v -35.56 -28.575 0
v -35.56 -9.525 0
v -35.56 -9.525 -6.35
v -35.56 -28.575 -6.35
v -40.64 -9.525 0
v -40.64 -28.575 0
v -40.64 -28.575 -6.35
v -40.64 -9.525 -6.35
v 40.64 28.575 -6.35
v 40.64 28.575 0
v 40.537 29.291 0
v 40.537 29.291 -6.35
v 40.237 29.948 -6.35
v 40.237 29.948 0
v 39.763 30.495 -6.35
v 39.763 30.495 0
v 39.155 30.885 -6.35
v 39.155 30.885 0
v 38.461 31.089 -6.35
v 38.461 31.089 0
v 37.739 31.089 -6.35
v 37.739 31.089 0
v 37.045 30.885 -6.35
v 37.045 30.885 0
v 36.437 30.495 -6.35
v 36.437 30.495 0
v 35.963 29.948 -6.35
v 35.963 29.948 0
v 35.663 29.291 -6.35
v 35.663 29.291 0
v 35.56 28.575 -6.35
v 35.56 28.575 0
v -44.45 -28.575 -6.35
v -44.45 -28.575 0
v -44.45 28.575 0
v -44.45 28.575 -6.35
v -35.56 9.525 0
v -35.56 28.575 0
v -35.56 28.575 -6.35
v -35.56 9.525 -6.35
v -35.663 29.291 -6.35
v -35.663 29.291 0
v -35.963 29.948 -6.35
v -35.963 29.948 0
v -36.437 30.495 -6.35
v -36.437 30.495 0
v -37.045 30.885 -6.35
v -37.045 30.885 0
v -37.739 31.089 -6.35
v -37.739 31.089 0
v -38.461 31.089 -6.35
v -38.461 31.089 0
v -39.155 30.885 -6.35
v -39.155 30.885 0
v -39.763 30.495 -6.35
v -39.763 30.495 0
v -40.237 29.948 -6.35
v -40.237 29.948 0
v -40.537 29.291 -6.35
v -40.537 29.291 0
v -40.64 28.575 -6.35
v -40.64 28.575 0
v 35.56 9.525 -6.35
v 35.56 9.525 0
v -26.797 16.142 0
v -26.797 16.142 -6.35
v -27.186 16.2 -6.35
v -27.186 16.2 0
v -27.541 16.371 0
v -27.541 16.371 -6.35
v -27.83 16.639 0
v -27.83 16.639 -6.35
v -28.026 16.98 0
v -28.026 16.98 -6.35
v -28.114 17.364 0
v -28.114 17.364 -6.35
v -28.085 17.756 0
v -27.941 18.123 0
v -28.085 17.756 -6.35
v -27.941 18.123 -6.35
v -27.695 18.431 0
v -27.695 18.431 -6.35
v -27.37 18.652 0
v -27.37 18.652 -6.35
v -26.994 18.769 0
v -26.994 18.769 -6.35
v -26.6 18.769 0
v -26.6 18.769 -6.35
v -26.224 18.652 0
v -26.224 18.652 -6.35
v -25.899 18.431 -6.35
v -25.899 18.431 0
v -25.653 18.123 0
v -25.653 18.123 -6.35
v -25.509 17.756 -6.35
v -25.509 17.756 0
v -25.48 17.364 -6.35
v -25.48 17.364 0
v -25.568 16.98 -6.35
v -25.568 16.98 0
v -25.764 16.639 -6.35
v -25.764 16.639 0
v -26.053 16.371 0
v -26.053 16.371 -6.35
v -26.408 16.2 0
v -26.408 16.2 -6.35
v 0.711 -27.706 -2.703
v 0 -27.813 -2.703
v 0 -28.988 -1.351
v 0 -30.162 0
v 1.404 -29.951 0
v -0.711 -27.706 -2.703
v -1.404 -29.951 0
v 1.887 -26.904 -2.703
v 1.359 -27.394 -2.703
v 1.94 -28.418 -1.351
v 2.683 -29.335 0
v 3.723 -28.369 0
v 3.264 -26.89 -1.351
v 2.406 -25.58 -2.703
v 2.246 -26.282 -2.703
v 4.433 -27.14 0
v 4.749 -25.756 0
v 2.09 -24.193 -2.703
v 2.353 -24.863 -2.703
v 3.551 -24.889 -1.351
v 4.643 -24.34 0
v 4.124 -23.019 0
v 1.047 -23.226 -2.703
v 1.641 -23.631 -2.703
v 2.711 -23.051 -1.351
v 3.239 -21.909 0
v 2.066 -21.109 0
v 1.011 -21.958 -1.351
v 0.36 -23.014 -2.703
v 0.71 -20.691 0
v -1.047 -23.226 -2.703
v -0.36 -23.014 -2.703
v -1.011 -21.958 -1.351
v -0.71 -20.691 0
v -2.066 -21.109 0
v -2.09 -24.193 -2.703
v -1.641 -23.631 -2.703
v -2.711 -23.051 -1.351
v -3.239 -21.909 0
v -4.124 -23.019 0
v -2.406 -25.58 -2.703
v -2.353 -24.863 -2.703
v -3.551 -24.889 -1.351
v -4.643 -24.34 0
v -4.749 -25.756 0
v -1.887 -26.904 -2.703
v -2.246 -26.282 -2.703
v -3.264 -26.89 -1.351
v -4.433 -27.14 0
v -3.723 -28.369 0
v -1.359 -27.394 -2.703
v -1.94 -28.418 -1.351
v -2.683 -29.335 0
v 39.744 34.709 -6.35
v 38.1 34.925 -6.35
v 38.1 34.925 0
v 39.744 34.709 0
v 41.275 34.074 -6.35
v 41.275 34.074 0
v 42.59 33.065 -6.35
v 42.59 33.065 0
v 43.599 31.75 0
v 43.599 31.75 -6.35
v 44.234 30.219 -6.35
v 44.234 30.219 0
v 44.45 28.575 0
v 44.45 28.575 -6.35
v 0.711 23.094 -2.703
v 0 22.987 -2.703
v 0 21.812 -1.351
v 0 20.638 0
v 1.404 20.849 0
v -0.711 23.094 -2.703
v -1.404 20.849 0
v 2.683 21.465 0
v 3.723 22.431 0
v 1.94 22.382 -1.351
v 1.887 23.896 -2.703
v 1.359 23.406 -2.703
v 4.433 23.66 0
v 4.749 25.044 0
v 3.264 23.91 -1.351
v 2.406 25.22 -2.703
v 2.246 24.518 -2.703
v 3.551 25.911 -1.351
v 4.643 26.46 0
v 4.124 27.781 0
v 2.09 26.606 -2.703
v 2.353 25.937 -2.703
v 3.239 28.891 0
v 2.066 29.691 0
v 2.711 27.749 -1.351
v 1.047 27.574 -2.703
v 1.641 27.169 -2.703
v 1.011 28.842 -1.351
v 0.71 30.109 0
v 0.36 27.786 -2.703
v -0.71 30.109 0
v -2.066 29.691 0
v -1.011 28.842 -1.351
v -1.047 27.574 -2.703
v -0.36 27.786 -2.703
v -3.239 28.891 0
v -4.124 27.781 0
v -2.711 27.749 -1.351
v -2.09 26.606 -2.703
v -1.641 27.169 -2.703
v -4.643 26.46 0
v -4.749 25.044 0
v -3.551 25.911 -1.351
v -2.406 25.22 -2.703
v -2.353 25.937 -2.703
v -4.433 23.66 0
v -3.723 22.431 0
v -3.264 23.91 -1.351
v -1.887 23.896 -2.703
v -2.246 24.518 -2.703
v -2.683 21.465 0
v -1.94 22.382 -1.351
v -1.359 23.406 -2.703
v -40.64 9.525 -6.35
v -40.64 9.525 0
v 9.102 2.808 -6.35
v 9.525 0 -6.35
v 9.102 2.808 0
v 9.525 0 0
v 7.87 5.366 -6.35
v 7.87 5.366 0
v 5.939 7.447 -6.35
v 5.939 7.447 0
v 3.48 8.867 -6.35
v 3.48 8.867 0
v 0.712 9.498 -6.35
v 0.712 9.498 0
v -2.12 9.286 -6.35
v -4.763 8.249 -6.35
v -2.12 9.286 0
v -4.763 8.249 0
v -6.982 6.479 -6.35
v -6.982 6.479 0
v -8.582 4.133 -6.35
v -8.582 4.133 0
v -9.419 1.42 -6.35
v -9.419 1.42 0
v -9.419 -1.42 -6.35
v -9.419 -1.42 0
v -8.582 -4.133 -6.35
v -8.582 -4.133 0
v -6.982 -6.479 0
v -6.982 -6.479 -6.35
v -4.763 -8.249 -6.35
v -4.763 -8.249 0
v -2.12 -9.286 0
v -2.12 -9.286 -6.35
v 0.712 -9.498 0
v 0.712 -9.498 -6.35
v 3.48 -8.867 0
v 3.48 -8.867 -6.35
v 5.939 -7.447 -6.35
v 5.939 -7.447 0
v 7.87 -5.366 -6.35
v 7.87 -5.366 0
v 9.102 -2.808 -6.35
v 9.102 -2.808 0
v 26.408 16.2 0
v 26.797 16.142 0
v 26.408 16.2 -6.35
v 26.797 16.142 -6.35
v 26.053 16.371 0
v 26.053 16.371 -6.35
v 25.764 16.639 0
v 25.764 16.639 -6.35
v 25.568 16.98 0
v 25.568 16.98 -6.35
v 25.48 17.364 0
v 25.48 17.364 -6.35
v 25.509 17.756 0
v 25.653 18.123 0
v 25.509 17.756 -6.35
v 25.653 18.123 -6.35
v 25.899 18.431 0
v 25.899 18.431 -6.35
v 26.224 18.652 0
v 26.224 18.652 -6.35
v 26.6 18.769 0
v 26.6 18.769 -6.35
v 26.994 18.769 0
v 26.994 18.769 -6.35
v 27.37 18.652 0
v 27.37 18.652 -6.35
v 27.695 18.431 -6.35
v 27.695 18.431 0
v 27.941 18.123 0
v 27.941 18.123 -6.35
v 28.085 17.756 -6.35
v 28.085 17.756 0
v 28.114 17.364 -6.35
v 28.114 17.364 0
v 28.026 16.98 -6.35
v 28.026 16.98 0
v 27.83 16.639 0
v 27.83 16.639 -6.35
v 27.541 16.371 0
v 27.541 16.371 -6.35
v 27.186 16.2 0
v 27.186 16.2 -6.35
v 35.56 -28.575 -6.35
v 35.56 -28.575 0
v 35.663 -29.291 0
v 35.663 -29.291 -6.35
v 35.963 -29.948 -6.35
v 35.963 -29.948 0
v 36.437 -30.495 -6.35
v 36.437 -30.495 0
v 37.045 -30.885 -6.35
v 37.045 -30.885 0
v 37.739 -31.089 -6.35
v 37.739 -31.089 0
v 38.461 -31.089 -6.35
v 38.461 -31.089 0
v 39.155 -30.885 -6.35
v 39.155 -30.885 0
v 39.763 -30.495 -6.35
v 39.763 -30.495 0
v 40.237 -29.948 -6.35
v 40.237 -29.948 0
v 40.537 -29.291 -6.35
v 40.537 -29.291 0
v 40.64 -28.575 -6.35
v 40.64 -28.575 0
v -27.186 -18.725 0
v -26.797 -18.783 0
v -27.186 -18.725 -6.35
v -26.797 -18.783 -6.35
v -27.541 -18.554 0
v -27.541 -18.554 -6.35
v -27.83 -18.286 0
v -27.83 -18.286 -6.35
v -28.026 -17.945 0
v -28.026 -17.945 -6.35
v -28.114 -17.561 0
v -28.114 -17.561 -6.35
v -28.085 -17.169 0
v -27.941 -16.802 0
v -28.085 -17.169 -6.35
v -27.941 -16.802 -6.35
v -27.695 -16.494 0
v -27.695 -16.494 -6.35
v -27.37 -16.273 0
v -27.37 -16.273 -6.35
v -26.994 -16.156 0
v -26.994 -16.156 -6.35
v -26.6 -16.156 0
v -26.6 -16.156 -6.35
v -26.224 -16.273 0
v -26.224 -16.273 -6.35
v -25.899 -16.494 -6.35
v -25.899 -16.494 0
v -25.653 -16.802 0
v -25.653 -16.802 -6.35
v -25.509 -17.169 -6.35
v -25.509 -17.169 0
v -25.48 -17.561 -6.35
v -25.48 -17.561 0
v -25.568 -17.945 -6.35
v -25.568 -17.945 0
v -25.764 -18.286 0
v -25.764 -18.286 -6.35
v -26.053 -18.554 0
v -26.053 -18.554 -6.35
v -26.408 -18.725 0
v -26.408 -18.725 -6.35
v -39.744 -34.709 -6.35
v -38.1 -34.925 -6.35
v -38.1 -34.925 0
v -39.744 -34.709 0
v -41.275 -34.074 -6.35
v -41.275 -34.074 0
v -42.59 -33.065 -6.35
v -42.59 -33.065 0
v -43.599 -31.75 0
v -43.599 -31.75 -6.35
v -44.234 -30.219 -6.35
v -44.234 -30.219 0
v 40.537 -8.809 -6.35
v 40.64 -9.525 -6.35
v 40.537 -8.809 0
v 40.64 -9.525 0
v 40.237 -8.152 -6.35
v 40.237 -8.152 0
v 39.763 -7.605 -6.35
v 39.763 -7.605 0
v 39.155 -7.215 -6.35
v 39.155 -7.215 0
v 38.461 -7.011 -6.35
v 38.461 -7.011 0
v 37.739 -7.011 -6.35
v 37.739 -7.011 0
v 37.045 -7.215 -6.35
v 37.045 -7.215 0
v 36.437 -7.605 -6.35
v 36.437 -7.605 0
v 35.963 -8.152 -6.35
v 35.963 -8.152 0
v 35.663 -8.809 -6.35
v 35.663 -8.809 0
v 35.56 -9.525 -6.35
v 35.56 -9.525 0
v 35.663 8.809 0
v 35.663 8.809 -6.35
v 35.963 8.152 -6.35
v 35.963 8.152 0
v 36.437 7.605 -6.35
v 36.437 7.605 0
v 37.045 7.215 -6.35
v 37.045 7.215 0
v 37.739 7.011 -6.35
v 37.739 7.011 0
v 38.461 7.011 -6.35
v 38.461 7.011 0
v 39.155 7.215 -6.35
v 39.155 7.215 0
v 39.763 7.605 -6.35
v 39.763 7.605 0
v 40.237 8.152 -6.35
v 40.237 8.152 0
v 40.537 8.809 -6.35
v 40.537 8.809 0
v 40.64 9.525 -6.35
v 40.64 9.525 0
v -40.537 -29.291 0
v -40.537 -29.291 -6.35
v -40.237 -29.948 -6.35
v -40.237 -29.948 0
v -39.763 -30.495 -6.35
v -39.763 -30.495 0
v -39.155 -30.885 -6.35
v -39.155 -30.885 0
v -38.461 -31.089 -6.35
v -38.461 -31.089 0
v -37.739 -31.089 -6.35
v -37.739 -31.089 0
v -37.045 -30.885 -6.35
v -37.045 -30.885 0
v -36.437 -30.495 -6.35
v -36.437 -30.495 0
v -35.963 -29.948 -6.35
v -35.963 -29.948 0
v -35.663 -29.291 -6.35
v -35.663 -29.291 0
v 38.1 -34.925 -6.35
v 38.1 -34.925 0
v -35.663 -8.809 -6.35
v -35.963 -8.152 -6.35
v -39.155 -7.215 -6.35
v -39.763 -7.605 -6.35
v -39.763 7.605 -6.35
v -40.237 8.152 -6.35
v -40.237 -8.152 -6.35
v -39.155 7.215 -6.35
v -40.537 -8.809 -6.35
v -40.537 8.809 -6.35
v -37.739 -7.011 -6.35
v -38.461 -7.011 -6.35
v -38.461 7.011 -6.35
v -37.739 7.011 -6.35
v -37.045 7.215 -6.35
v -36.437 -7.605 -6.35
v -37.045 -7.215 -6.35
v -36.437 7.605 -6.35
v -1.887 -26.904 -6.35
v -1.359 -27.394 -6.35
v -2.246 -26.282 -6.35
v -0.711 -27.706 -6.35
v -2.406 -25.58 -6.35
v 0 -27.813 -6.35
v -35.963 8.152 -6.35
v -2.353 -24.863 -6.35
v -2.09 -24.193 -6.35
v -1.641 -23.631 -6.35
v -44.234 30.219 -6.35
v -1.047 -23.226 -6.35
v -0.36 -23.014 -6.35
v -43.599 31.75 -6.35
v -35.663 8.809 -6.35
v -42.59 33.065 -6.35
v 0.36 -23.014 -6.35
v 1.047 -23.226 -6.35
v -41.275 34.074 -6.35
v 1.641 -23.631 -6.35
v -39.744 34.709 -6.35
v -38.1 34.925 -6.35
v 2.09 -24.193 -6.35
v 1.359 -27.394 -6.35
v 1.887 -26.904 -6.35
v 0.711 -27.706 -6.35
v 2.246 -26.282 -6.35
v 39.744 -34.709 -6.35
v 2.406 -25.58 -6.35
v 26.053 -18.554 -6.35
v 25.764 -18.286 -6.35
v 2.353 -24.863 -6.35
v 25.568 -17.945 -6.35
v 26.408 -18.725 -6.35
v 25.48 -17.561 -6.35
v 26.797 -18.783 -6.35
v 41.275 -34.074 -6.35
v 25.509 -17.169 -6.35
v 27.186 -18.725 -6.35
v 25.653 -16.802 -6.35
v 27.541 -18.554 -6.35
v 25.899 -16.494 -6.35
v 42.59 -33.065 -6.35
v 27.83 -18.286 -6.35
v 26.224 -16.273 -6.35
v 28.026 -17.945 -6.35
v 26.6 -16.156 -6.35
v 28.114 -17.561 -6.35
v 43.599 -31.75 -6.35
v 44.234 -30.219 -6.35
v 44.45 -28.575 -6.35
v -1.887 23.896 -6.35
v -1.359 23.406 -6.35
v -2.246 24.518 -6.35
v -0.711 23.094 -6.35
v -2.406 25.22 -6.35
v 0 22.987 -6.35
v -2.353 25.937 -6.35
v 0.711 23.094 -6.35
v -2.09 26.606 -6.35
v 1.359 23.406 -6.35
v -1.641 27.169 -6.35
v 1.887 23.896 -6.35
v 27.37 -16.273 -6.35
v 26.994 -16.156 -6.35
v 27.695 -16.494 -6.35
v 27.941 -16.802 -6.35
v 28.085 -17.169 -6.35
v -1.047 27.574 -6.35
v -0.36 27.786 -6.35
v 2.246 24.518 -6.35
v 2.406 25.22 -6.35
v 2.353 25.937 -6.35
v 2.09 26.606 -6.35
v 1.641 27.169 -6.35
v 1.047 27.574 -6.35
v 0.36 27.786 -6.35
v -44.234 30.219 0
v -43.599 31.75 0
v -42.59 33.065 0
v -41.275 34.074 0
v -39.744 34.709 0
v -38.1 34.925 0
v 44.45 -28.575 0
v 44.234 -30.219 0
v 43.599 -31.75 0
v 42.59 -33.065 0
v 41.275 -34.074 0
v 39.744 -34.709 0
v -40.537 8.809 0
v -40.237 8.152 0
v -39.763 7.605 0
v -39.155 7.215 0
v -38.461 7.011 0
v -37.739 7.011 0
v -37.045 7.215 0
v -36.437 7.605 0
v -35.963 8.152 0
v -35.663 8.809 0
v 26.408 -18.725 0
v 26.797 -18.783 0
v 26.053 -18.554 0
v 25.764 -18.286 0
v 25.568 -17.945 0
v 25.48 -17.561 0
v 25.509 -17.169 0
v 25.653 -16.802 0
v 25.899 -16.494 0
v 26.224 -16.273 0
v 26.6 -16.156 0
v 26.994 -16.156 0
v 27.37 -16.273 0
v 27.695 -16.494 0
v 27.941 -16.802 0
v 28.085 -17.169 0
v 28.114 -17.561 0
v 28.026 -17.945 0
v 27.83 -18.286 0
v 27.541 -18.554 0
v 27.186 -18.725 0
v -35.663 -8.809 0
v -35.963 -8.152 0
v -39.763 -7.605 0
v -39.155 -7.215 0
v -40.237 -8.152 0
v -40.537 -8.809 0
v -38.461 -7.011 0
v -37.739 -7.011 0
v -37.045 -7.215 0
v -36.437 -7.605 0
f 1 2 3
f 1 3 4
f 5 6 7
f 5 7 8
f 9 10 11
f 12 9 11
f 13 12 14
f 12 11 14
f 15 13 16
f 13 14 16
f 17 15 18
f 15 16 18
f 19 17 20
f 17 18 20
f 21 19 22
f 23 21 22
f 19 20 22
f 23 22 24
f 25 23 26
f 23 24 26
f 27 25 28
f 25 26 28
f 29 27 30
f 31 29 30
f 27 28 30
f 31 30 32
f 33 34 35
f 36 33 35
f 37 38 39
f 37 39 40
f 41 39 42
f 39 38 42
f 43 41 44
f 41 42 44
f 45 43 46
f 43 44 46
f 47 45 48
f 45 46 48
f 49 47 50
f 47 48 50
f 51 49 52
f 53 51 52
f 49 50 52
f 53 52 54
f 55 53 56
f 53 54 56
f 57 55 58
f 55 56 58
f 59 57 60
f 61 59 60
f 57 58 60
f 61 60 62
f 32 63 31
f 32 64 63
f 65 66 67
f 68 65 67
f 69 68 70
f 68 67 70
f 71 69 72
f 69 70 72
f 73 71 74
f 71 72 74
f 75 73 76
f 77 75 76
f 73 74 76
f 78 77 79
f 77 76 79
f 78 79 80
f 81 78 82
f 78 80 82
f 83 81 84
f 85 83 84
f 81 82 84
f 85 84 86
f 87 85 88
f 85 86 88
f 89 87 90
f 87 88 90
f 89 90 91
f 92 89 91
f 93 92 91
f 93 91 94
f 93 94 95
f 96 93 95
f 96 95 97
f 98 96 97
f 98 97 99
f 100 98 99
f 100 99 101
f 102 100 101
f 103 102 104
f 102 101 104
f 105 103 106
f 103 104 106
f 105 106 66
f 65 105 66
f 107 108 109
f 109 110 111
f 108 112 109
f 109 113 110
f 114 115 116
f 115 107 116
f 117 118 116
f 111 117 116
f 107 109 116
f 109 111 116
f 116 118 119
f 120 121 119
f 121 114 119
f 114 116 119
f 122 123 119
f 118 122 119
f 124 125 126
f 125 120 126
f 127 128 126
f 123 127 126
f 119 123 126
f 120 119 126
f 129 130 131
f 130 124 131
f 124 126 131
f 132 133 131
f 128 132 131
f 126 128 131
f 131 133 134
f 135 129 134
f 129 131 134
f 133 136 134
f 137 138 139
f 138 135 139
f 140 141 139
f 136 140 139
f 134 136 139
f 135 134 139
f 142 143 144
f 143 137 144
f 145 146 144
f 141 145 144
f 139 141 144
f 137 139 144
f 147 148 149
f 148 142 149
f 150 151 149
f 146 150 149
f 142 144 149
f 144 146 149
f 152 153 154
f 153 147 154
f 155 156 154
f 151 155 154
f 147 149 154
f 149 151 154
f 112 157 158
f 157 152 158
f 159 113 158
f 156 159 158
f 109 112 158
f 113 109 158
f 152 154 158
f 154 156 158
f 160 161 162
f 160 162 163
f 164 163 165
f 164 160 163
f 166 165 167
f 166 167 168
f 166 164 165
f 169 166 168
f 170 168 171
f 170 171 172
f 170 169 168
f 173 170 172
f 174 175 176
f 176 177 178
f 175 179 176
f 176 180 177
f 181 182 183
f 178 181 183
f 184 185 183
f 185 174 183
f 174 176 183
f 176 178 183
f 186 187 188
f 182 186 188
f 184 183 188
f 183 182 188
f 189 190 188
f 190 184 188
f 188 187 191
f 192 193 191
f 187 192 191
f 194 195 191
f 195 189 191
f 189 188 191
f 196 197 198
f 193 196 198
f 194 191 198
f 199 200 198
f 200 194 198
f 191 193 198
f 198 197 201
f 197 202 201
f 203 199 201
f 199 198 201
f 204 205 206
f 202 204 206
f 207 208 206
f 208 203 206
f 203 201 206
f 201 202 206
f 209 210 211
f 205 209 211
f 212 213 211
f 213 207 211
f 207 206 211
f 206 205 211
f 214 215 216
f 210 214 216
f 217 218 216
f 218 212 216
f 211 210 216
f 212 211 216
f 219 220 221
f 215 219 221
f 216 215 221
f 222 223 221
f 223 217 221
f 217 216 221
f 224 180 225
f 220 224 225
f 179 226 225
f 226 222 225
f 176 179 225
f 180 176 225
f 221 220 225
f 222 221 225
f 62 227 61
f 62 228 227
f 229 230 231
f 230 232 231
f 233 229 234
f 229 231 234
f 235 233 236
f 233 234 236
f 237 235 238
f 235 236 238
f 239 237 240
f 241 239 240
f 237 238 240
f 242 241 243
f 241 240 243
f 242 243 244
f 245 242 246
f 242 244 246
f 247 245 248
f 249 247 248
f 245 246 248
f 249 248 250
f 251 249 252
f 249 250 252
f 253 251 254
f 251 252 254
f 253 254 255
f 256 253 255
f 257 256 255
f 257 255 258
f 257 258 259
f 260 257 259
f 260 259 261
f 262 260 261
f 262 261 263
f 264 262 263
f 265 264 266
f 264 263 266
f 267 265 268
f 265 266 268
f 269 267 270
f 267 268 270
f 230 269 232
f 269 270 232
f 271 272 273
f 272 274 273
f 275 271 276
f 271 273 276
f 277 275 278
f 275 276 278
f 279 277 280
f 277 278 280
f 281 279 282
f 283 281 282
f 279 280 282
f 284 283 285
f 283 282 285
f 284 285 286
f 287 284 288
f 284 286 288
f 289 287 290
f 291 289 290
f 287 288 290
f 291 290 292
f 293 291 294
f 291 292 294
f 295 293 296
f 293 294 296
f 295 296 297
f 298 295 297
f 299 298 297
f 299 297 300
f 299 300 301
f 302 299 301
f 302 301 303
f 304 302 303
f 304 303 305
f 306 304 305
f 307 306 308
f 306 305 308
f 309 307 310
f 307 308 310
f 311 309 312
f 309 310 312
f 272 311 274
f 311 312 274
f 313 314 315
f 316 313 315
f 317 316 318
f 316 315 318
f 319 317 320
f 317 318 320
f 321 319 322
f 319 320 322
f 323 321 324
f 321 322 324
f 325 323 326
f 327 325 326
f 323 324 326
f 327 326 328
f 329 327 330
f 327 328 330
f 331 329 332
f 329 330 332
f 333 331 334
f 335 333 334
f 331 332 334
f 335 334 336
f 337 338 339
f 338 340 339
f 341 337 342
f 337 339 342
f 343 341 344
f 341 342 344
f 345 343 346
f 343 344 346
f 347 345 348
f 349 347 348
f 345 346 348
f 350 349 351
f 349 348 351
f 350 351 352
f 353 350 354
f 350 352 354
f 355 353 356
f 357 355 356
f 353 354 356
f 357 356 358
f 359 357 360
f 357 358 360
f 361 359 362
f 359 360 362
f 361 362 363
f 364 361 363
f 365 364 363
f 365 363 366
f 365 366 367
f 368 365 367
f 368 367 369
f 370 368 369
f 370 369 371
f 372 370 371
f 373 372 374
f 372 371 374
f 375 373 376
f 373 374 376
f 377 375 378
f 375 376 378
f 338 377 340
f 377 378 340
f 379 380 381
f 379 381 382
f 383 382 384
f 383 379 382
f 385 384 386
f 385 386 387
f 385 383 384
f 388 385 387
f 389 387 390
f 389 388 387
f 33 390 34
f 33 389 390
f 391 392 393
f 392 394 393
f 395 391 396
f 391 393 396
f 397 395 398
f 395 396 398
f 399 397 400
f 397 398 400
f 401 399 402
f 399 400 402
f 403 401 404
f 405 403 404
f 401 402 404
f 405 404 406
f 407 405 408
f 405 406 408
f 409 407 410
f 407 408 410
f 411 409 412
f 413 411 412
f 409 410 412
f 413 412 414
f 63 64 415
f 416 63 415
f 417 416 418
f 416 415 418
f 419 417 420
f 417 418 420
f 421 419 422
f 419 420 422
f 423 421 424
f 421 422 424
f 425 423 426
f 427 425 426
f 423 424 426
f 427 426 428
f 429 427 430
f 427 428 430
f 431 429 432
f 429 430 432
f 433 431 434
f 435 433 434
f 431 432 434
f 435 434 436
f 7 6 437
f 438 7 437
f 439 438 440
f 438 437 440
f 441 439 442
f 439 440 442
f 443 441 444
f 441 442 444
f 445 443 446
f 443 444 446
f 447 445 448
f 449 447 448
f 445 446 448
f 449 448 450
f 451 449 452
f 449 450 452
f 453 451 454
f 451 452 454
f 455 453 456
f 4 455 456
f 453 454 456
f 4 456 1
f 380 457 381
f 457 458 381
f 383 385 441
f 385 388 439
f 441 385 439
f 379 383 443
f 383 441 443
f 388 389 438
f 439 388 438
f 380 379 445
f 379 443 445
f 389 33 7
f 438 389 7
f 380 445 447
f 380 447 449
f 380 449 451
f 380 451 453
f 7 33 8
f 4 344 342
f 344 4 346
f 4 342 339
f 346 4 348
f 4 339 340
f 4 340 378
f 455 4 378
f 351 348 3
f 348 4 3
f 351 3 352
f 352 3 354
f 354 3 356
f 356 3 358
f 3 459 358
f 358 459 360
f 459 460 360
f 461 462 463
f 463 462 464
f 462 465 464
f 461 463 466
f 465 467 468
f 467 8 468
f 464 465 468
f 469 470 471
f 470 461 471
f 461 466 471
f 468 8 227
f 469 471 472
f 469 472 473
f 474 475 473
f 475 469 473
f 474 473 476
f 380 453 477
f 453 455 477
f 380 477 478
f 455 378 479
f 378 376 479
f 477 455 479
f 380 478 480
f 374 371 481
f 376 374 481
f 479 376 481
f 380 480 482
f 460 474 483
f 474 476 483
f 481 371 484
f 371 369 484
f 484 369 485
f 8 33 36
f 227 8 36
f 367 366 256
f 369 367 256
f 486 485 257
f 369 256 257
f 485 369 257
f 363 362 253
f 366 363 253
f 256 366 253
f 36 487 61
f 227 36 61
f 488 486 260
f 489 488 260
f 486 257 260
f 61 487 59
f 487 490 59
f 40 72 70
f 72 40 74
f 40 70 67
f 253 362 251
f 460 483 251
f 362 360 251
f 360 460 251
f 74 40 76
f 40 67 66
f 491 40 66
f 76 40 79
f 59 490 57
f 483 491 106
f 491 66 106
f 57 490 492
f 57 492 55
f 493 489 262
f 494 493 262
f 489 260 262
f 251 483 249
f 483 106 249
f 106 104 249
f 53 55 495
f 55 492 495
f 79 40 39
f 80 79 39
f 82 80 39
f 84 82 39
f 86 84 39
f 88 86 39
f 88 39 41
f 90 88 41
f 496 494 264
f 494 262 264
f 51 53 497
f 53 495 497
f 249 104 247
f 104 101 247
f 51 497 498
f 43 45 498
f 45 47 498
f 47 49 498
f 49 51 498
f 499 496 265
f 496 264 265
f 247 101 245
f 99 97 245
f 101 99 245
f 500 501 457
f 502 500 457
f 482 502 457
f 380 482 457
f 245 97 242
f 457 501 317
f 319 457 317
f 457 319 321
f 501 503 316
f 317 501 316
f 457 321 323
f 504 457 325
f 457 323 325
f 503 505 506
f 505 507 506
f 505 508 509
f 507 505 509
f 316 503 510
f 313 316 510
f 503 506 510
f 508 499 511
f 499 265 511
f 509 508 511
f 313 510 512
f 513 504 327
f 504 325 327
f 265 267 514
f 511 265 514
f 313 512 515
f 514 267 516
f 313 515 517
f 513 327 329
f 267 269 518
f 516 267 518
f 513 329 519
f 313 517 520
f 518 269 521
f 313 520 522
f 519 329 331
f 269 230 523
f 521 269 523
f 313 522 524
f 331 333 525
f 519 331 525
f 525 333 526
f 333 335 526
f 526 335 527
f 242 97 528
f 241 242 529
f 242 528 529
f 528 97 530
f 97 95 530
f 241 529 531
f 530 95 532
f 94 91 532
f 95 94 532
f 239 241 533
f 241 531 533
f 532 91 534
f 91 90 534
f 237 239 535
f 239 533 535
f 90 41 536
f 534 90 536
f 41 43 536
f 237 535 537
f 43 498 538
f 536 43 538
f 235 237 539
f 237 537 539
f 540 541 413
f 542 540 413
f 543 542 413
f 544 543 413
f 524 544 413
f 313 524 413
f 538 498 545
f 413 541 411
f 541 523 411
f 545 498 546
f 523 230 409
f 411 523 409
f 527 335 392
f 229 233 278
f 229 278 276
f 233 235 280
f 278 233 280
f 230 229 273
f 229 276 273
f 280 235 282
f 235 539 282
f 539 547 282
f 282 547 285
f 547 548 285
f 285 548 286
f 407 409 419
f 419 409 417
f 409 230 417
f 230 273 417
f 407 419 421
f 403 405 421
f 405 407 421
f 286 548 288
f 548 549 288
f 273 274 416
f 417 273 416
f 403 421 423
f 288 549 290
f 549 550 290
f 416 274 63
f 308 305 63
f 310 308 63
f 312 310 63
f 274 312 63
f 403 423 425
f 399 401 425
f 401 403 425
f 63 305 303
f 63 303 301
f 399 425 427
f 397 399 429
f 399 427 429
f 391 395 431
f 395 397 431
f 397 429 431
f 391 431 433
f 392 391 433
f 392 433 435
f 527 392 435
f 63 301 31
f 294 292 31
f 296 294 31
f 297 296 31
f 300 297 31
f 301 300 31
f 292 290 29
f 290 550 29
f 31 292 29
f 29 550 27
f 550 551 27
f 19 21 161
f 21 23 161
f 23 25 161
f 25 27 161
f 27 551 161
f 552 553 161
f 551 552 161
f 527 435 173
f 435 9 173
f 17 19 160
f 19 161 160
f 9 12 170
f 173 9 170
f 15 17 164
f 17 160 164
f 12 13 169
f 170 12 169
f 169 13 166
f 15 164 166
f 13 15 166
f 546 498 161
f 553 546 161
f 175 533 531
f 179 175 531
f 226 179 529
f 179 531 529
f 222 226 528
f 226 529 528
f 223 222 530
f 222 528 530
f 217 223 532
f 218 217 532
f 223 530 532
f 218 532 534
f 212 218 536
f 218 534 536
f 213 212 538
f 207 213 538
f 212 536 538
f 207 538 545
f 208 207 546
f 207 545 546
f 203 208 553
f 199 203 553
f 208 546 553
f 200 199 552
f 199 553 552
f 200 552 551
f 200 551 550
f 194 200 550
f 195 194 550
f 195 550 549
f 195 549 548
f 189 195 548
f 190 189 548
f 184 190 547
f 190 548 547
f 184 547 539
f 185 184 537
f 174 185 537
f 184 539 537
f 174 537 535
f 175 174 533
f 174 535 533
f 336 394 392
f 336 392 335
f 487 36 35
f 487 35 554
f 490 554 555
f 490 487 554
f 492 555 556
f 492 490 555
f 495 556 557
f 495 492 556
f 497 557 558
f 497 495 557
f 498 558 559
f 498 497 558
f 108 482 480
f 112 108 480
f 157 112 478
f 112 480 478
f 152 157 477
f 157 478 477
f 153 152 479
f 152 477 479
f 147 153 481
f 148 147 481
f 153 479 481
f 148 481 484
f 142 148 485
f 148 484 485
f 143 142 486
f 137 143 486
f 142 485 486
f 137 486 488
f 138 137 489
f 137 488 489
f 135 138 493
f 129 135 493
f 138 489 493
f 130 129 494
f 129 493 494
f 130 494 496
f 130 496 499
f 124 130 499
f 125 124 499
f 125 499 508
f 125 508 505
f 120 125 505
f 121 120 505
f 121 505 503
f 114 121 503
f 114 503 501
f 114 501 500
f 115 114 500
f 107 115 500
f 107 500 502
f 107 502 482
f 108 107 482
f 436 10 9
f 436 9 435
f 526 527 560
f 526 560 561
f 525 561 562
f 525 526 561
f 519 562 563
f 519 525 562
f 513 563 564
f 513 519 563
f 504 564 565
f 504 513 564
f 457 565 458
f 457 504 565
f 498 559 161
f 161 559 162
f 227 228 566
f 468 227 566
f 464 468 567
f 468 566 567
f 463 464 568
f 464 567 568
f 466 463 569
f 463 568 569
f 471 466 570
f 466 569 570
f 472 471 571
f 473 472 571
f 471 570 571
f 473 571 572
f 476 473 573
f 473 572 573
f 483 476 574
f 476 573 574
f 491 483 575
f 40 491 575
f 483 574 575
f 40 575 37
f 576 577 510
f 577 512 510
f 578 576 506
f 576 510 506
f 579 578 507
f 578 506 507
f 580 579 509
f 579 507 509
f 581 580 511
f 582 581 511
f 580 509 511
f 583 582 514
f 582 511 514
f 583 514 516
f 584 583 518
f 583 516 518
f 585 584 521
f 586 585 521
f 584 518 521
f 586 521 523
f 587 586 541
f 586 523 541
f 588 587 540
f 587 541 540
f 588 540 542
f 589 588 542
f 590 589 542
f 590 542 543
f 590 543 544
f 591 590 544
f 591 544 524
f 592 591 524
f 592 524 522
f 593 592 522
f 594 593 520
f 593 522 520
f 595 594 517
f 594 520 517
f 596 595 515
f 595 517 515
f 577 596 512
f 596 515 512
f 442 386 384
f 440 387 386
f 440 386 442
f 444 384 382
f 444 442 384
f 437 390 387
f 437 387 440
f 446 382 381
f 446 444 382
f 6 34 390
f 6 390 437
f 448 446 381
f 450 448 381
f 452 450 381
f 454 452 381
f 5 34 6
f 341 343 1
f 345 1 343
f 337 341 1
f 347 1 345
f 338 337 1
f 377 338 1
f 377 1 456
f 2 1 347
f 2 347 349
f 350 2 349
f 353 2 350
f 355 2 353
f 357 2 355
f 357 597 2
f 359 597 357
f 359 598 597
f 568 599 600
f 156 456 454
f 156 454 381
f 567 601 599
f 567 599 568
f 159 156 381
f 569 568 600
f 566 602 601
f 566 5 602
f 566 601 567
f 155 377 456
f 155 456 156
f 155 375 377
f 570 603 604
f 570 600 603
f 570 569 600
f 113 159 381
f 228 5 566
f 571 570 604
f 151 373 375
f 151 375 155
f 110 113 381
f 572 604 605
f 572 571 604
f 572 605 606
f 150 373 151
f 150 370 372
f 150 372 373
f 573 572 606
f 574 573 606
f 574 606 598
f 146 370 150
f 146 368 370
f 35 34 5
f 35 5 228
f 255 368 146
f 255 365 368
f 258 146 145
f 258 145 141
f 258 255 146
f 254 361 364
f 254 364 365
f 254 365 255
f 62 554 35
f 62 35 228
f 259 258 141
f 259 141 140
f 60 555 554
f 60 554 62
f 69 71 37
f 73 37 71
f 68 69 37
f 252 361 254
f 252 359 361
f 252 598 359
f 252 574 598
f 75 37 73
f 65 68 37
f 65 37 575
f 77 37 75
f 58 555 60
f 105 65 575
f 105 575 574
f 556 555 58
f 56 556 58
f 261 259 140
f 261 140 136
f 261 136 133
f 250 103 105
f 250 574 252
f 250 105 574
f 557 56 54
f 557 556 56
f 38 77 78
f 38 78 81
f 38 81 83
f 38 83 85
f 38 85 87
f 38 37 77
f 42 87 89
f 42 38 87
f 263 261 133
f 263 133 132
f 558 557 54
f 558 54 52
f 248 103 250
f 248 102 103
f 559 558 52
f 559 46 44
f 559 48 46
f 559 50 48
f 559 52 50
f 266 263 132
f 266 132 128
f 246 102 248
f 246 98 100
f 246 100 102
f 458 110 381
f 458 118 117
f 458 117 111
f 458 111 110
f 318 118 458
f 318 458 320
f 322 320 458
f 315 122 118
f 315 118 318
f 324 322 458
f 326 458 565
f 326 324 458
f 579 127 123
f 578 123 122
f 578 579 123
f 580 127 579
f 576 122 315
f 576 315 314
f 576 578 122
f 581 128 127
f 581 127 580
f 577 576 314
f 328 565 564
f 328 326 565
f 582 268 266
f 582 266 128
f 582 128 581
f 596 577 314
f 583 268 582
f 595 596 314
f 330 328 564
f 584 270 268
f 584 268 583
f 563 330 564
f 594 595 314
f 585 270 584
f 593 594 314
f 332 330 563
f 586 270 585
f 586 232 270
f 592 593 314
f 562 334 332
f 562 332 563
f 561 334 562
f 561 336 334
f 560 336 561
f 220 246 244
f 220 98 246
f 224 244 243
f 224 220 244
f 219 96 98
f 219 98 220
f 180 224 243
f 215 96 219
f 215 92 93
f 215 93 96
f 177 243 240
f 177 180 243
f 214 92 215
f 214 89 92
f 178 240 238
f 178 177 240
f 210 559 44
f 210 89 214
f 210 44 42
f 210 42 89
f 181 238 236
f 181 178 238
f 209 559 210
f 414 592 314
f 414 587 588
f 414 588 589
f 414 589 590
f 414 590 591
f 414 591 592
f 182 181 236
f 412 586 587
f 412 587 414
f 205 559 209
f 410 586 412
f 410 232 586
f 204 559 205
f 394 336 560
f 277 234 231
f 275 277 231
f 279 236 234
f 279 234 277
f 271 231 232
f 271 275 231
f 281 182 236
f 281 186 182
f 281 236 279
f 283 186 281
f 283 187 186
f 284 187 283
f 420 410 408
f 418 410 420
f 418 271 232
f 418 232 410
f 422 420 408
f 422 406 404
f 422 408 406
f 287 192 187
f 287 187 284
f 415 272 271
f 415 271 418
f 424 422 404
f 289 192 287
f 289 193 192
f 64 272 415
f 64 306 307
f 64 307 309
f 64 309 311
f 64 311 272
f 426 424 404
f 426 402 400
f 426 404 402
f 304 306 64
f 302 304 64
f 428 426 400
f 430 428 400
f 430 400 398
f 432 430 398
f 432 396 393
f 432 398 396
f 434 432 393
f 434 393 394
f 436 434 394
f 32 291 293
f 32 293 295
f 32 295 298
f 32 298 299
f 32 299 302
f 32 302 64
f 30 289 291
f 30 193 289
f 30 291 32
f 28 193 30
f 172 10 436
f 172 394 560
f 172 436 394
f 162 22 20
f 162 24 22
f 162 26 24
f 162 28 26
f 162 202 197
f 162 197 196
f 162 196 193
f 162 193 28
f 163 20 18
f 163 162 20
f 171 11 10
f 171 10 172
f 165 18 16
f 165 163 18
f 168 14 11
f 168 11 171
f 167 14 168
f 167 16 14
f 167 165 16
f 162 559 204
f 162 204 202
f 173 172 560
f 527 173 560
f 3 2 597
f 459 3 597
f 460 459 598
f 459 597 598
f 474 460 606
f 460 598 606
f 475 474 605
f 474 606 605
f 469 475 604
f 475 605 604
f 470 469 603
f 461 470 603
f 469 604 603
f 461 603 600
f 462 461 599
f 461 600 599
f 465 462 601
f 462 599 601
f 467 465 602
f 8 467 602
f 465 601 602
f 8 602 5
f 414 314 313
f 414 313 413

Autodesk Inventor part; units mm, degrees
ref_plane "YZ Plane" through (0, 0, 0) normal (1, 0, 0) x (0, 1, 0)
ref_plane "XZ Plane" through (0, 0, 0) normal (0, 1, 0) x (-1, 0, 0)
ref_plane "XY Plane" through (0, 0, 0) normal (0, 0, 1) x (1, 0, 0)
sketch "Sketch1" plane through (0, 0, 0) normal (0, 0, 1) x (1, 0, 0)
  circle A0 centre (0, 0) radius 34.925
  circle A1 centre (0, 0) radius 9.525
  line L0 (-44.45, 34.925) -> (44.45, 34.925)
  line L1 (44.45, 34.925) -> (44.45, -34.925)
  line L2 (44.45, -34.925) -> (-44.45, -34.925)
  line L3 (-44.45, -34.925) -> (-44.45, 34.925)
  line L4 (-40.64, 28.575) -> (-35.56, 28.575)
  line L5 (-35.56, 28.575) -> (-35.56, 9.525)
  line L6 (-35.56, 9.525) -> (-40.64, 9.525)
  line L7 (-40.64, 9.525) -> (-40.64, 28.575)
  arc A2 (-35.56, 28.575) -> (-40.64, 28.575) centre (-38.1, 28.575) ccw
  arc A3 (-40.64, 9.525) -> (-35.56, 9.525) centre (-38.1, 9.525) ccw
  line L8 (35.56, 28.575) -> (40.64, 28.575)
  line L9 (40.64, 28.575) -> (40.64, 9.525)
  line L10 (40.64, 9.525) -> (35.56, 9.525)
  line L11 (35.56, 9.525) -> (35.56, 28.575)
  arc A4 (40.64, 28.575) -> (35.56, 28.575) centre (38.1, 28.575) ccw
  arc A5 (35.56, 9.525) -> (40.64, 9.525) centre (38.1, 9.525) ccw
  line L12 (-40.64, -9.525) -> (-35.56, -9.525)
  line L13 (-35.56, -9.525) -> (-35.56, -28.575)
  line L14 (-35.56, -28.575) -> (-40.64, -28.575)
  line L15 (-40.64, -28.575) -> (-40.64, -9.525)
  arc A6 (-35.56, -9.525) -> (-40.64, -9.525) centre (-38.1, -9.525) ccw
  arc A7 (-40.64, -28.575) -> (-35.56, -28.575) centre (-38.1, -28.575) ccw
  line L16 (35.56, -9.525) -> (40.64, -9.525)
  line L17 (40.64, -9.525) -> (40.64, -28.575)
  line L18 (40.64, -28.575) -> (35.56, -28.575)
  line L19 (35.56, -28.575) -> (35.56, -9.525)
  arc A8 (40.64, -9.525) -> (35.56, -9.525) centre (38.1, -9.525) ccw
  arc A9 (35.56, -28.575) -> (40.64, -28.575) centre (38.1, -28.575) ccw
  point P0 (0, 25.4)
  point P1 (0, -25.4)
  point P2 (-26.797, -17.4625)
  point P3 (-26.797, 17.4625)
  point P4 (26.797, 17.4625)
  point P5 (26.797, -17.4625)
  dimension "d0" = 69.85
  dimension "d1" = 19.05
  dimension "d2" = 25.4
  dimension "d3" = 25.4
  dimension "d4" = 26.797
  dimension "d5" = 17.4625
  dimension "d6" = 17.4625
  dimension "d7" = 26.797
  dimension "d24" = 34.925
  dimension "d25" = 69.85
  dimension "d26" = 44.45
  dimension "d28" = 44.45
  dimension "d30" = 5.08
  dimension "d31" = 19.05
  dimension "d33" = 6.35
  dimension "d34" = 6.35
  dimension "d37" = 76.2
  dimension "d40" = 38.1
extrude "Extrusion1" add sketch "Sketch1" against normal blind 6.35 contours A0
hole "Hole1" at (-26.797, -17.4625, 0) at (-26.797, 17.4625, 0) at (26.797, 17.4625, 0) at (26.797, -17.4625, 0) direction (0, 0, -1) diameter 2.6416 end through all thread size "6-32 UNC" class "2B" standard "ANSI Unified Screw Threads"
hole "Hole2" at (0, 25.4, 0) at (0, -25.4, 0) direction (0, 0, -1) diameter 4.826 end through all countersink diameter 9.525 countersink angle 82
extrude "Extrusion2" add sketch "Sketch1" against normal blind 6.35 contours A0 L0 L1 L2 | A0 L2 L3 L0
fillet "Fillet1" radius 6.35 4 edges at (-44.45, 34.925, -3.175) (44.45, 34.925, -3.175) (44.45, -34.925, -3.175) (-44.45, -34.925, -3.175)
equation "\"d28\" = d26"
properties part number "Dewalt Drill Drive CIMmotor Adaptor rectangle"
